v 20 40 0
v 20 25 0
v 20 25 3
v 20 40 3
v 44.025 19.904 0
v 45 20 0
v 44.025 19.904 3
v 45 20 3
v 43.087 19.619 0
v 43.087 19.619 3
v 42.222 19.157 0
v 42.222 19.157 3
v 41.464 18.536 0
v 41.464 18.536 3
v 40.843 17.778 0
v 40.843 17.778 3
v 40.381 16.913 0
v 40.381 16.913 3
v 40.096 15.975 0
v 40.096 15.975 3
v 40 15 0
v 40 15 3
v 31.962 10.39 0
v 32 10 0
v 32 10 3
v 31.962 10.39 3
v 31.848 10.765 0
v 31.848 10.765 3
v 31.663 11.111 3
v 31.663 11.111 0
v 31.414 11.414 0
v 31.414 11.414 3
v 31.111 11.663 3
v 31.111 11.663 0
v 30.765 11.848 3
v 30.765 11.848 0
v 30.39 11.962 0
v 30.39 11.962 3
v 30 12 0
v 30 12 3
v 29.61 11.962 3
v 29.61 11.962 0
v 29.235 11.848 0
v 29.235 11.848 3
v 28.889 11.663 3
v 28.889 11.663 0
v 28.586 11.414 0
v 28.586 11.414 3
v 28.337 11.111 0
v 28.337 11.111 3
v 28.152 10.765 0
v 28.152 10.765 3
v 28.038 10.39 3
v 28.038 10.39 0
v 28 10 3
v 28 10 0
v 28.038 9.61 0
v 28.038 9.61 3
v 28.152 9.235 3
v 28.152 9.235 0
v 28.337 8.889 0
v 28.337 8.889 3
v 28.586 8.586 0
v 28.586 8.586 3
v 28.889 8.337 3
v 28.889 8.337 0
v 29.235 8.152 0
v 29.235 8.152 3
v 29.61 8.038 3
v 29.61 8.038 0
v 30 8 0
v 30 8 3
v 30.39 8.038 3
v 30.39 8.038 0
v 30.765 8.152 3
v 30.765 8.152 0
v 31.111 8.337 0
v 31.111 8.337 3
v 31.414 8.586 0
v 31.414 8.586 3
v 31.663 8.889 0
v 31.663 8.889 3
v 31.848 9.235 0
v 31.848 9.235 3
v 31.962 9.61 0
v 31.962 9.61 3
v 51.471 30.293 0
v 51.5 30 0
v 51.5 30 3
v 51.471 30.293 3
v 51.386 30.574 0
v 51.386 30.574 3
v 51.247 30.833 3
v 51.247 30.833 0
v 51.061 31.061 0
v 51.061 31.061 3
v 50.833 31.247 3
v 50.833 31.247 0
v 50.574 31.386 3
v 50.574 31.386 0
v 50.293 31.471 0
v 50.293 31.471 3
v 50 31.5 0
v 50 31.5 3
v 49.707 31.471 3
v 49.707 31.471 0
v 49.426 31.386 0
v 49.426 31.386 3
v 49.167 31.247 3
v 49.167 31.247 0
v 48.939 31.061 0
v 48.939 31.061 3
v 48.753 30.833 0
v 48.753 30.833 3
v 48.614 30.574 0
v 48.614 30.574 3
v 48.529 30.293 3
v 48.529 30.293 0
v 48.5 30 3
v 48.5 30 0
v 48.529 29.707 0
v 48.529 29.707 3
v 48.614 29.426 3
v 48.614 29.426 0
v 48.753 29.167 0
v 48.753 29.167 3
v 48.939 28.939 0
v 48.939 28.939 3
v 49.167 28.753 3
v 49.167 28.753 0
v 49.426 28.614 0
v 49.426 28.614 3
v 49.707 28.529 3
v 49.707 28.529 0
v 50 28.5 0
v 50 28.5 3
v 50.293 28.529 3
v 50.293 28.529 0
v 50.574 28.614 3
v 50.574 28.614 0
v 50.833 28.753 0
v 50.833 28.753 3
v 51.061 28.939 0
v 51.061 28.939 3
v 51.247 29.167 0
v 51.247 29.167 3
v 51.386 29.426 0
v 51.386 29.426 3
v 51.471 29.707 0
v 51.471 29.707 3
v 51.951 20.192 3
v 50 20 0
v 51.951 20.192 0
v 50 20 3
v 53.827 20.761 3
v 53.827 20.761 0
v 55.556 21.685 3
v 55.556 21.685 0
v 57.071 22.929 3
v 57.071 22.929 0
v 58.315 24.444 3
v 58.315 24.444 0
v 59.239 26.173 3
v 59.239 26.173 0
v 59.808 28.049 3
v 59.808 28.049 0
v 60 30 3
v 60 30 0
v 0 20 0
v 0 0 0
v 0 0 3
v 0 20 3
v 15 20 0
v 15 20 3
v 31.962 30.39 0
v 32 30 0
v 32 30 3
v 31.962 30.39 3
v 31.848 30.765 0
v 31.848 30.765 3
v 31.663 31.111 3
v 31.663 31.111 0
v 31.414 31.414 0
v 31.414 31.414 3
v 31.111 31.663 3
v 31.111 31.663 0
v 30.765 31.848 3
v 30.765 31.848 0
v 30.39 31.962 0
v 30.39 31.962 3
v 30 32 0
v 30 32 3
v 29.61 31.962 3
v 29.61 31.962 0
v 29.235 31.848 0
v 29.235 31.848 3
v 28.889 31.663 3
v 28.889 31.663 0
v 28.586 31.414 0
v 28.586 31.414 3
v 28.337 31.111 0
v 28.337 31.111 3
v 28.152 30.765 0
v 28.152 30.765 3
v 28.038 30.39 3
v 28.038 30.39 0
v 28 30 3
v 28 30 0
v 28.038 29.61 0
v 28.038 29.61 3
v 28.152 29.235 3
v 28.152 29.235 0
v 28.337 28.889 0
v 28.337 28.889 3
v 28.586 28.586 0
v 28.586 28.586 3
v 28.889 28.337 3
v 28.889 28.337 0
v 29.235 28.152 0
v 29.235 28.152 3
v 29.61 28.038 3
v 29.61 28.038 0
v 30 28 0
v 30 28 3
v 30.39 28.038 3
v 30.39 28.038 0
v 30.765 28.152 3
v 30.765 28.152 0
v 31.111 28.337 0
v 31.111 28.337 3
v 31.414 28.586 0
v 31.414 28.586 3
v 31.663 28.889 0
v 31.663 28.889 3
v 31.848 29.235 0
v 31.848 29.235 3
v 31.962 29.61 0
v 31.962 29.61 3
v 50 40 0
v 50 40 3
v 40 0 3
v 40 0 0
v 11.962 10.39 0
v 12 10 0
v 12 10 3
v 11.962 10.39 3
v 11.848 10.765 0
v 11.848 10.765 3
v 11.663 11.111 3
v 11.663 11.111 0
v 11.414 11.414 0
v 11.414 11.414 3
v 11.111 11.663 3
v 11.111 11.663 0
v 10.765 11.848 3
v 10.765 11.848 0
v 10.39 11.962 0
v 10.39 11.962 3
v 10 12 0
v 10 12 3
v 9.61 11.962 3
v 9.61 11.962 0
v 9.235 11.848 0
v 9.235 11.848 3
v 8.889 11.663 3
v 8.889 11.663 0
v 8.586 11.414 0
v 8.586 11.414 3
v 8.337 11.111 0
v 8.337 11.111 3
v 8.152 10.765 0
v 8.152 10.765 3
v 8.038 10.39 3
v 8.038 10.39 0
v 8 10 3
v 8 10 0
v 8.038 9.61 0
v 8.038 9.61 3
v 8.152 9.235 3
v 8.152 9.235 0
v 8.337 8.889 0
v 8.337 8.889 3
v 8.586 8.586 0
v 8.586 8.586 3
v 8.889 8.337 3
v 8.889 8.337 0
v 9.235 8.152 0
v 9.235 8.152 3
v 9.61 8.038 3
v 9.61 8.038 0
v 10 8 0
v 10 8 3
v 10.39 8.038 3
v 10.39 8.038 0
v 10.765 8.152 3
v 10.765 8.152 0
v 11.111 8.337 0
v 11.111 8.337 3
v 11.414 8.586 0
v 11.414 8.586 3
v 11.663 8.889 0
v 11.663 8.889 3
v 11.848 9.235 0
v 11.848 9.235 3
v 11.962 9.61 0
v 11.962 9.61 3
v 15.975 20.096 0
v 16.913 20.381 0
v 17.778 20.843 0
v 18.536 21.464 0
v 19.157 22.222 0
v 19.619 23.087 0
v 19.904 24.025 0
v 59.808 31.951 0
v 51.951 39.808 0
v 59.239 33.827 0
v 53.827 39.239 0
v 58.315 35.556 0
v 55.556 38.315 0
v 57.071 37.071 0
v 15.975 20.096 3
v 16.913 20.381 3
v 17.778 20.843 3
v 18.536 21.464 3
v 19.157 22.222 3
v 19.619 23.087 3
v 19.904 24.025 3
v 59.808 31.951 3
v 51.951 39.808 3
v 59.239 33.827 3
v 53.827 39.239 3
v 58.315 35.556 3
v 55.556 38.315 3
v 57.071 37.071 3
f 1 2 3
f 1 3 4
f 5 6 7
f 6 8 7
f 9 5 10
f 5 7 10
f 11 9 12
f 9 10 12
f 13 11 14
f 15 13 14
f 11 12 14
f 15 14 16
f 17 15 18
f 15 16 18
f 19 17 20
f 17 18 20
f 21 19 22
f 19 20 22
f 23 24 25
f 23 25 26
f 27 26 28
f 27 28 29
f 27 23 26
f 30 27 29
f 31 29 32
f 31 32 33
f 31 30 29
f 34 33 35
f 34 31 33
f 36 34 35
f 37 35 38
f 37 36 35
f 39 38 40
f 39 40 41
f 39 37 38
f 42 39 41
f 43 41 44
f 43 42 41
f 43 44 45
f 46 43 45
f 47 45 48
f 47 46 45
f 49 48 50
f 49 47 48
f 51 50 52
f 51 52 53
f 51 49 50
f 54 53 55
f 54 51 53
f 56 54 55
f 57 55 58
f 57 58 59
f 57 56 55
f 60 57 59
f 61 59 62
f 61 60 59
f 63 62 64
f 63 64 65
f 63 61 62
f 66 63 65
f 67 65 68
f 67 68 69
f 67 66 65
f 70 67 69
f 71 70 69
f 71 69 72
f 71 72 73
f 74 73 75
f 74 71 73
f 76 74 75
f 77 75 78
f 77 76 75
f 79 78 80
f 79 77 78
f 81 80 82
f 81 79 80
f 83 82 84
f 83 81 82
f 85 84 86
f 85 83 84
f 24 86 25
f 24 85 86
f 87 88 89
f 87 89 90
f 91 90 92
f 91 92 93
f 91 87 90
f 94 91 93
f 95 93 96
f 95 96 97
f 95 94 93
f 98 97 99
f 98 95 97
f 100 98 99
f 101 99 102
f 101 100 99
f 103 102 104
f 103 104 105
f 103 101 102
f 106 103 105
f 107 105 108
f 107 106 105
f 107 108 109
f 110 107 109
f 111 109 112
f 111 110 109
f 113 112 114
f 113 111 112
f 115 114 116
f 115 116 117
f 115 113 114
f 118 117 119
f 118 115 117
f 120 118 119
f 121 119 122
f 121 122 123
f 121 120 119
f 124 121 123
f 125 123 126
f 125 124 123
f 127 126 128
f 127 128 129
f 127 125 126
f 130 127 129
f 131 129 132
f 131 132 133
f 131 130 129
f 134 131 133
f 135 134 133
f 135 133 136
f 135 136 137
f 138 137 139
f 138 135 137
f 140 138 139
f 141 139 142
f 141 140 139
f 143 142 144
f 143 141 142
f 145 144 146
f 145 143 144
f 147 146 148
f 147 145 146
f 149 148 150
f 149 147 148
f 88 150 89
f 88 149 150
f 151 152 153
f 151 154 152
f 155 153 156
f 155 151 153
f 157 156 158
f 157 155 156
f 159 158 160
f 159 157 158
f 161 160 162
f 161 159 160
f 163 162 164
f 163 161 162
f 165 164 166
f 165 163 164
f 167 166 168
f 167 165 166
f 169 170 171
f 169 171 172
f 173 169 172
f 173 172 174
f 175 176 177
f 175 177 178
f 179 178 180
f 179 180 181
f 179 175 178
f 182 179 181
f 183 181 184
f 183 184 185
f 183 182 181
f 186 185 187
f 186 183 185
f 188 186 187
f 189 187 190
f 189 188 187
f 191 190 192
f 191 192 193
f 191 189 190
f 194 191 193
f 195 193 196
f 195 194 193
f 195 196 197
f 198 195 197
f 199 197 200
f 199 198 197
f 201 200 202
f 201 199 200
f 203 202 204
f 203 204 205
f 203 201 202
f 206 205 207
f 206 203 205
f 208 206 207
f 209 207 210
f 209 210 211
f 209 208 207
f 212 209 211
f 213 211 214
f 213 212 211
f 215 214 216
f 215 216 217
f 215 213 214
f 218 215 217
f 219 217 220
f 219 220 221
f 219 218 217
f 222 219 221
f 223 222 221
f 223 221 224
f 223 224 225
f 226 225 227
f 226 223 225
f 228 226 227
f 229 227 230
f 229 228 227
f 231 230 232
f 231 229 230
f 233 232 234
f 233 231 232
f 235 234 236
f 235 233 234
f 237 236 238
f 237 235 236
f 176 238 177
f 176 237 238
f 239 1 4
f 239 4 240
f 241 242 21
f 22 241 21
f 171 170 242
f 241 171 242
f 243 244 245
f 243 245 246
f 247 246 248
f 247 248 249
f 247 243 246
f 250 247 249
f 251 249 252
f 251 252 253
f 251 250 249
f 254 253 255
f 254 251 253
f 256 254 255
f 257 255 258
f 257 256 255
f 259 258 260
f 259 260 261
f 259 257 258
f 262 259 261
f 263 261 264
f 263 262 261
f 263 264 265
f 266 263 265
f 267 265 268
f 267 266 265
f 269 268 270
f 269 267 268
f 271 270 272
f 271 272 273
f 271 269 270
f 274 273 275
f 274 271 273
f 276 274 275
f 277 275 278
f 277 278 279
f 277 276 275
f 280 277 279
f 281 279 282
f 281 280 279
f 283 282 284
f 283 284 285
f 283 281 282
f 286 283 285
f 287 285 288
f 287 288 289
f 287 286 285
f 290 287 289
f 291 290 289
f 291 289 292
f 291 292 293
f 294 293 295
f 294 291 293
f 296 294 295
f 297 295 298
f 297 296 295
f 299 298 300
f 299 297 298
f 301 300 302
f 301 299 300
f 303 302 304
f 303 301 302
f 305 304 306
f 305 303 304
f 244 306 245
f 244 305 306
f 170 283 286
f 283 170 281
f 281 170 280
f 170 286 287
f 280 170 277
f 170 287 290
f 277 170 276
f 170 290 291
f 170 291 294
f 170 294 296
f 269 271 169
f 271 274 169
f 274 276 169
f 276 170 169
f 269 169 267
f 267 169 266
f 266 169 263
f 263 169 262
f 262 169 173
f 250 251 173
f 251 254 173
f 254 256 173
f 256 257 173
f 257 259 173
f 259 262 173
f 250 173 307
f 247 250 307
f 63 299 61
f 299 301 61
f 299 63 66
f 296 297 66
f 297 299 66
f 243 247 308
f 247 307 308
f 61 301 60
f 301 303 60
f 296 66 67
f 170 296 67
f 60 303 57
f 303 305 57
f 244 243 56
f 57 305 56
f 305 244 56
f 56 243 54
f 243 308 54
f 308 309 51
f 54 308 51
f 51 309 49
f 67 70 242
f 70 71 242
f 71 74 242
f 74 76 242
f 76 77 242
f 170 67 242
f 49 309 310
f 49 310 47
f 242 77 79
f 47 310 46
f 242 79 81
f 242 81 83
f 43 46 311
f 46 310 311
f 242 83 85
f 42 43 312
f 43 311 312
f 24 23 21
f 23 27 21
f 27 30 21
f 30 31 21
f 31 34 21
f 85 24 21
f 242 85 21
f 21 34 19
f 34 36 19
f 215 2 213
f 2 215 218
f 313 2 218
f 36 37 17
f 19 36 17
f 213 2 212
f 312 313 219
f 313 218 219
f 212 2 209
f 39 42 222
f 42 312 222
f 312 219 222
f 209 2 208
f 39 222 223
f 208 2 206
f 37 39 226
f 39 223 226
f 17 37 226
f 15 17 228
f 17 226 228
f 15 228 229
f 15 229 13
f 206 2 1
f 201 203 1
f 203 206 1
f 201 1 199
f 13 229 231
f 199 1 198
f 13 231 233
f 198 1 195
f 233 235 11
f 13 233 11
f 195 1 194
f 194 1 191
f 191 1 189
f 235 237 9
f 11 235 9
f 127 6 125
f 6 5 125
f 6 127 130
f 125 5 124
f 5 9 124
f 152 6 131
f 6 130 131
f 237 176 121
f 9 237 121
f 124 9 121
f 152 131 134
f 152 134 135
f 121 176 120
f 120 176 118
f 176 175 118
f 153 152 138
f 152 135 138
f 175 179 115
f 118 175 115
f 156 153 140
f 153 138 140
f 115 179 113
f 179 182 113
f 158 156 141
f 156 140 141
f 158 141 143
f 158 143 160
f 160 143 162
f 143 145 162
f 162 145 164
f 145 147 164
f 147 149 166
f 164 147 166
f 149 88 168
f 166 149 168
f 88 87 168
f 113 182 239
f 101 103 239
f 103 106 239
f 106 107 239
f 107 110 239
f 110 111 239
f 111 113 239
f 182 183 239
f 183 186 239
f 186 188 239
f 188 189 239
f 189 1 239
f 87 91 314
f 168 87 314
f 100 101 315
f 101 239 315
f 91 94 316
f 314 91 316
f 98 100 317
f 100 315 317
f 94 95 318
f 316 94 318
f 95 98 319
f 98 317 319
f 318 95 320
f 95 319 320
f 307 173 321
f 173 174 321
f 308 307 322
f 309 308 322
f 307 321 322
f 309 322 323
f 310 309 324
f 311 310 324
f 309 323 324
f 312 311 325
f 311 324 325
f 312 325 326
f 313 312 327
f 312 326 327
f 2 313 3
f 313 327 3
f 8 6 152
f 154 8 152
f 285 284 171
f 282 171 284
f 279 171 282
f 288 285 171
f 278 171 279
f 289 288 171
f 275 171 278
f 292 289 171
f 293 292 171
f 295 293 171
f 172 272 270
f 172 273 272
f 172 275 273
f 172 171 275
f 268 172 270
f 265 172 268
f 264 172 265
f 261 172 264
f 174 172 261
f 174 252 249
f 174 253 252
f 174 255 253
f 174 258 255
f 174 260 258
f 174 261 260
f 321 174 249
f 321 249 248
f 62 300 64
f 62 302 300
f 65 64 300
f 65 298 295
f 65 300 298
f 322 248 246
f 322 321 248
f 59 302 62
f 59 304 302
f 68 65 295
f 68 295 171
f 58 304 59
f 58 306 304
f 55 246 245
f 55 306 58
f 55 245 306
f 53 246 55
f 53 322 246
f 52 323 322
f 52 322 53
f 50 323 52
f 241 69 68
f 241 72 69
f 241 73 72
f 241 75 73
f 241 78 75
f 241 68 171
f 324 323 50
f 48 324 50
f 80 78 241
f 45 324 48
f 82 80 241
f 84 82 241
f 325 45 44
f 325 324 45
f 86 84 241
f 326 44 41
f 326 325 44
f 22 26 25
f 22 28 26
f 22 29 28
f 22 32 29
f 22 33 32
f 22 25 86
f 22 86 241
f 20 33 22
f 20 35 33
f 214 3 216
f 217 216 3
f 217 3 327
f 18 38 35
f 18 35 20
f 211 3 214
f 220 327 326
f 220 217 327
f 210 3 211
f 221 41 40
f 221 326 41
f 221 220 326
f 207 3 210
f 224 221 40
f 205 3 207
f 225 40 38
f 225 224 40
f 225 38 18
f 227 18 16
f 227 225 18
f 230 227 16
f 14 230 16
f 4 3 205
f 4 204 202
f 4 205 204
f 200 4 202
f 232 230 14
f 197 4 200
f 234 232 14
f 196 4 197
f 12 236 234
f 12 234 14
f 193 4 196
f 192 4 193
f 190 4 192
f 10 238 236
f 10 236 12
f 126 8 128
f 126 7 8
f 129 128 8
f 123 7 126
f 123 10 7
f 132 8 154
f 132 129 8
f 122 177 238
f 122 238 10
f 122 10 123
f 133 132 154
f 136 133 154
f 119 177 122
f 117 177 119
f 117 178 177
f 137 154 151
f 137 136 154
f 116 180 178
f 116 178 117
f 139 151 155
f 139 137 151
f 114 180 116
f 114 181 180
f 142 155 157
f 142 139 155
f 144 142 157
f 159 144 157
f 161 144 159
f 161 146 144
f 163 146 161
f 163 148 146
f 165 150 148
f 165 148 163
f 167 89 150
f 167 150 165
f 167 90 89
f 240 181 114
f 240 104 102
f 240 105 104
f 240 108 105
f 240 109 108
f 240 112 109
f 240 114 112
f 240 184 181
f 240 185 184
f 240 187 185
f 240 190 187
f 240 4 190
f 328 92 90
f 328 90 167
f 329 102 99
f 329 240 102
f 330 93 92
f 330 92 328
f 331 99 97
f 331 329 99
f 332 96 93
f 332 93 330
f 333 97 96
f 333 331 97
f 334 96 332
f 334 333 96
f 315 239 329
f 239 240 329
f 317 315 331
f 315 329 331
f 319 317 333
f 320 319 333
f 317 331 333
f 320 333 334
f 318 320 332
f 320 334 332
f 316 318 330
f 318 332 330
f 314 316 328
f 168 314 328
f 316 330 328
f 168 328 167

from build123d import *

# Parameters (mm, degrees)
ESBO_O1_W                = 20
ESBO_O1_H                = 20
ESBO_O1_R                = 2
ESBO_O1_R_2              = 1.5
RESSALTO_EXTRUS_O1_DEPTH = 3
FILETE1_R                = 10
FILETE2_R                = 5


with BuildPart() as part:
    # Esboço1 → Ressalto-extrusão1 (new body)
    # profile 1 of 4: a face of its own
    with BuildSketch(Plane.XY):
        with Locations((10, 10)):
            Rectangle(ESBO_O1_W, ESBO_O1_H)
        with Locations((10, 10)):
            Circle(ESBO_O1_R, mode=Mode.SUBTRACT)
    # profile 2 of 4: a face of its own
    with BuildSketch(Plane.XY):
        with Locations((30, 10)):
            Rectangle(ESBO_O1_W, ESBO_O1_H)
        with Locations((30, 10)):
            Circle(ESBO_O1_R, mode=Mode.SUBTRACT)
    # profile 3 of 4: a face of its own
    with BuildSketch(Plane.XY):
        with Locations((30, 30)):
            Rectangle(ESBO_O1_W, ESBO_O1_H)
        with Locations((30, 30)):
            Circle(ESBO_O1_R, mode=Mode.SUBTRACT)
    # profile 4 of 4: a face of its own
    with BuildSketch(Plane.XY):
        with Locations((50, 30)):
            Rectangle(ESBO_O1_W, ESBO_O1_H)
        with Locations((50, 30)):
            Circle(ESBO_O1_R_2, mode=Mode.SUBTRACT)
    extrude(amount=RESSALTO_EXTRUS_O1_DEPTH)

    # Filete1
    filete1_edges = [part.edges().sort_by_distance(p)[0] for p in [
        (60, 20, 1.5),
        (60, 40, 1.5),
    ]]
    fillet(filete1_edges, radius=FILETE1_R - 0.0001)  # a hair under: the kernel refuses the full size

    # Filete2
    filete2_edges = [part.edges().sort_by_distance(p)[0] for p in [
        (20, 20, 1.5),
        (40, 20, 1.5),
    ]]
    fillet(filete2_edges, radius=FILETE2_R)


solid = part.part
